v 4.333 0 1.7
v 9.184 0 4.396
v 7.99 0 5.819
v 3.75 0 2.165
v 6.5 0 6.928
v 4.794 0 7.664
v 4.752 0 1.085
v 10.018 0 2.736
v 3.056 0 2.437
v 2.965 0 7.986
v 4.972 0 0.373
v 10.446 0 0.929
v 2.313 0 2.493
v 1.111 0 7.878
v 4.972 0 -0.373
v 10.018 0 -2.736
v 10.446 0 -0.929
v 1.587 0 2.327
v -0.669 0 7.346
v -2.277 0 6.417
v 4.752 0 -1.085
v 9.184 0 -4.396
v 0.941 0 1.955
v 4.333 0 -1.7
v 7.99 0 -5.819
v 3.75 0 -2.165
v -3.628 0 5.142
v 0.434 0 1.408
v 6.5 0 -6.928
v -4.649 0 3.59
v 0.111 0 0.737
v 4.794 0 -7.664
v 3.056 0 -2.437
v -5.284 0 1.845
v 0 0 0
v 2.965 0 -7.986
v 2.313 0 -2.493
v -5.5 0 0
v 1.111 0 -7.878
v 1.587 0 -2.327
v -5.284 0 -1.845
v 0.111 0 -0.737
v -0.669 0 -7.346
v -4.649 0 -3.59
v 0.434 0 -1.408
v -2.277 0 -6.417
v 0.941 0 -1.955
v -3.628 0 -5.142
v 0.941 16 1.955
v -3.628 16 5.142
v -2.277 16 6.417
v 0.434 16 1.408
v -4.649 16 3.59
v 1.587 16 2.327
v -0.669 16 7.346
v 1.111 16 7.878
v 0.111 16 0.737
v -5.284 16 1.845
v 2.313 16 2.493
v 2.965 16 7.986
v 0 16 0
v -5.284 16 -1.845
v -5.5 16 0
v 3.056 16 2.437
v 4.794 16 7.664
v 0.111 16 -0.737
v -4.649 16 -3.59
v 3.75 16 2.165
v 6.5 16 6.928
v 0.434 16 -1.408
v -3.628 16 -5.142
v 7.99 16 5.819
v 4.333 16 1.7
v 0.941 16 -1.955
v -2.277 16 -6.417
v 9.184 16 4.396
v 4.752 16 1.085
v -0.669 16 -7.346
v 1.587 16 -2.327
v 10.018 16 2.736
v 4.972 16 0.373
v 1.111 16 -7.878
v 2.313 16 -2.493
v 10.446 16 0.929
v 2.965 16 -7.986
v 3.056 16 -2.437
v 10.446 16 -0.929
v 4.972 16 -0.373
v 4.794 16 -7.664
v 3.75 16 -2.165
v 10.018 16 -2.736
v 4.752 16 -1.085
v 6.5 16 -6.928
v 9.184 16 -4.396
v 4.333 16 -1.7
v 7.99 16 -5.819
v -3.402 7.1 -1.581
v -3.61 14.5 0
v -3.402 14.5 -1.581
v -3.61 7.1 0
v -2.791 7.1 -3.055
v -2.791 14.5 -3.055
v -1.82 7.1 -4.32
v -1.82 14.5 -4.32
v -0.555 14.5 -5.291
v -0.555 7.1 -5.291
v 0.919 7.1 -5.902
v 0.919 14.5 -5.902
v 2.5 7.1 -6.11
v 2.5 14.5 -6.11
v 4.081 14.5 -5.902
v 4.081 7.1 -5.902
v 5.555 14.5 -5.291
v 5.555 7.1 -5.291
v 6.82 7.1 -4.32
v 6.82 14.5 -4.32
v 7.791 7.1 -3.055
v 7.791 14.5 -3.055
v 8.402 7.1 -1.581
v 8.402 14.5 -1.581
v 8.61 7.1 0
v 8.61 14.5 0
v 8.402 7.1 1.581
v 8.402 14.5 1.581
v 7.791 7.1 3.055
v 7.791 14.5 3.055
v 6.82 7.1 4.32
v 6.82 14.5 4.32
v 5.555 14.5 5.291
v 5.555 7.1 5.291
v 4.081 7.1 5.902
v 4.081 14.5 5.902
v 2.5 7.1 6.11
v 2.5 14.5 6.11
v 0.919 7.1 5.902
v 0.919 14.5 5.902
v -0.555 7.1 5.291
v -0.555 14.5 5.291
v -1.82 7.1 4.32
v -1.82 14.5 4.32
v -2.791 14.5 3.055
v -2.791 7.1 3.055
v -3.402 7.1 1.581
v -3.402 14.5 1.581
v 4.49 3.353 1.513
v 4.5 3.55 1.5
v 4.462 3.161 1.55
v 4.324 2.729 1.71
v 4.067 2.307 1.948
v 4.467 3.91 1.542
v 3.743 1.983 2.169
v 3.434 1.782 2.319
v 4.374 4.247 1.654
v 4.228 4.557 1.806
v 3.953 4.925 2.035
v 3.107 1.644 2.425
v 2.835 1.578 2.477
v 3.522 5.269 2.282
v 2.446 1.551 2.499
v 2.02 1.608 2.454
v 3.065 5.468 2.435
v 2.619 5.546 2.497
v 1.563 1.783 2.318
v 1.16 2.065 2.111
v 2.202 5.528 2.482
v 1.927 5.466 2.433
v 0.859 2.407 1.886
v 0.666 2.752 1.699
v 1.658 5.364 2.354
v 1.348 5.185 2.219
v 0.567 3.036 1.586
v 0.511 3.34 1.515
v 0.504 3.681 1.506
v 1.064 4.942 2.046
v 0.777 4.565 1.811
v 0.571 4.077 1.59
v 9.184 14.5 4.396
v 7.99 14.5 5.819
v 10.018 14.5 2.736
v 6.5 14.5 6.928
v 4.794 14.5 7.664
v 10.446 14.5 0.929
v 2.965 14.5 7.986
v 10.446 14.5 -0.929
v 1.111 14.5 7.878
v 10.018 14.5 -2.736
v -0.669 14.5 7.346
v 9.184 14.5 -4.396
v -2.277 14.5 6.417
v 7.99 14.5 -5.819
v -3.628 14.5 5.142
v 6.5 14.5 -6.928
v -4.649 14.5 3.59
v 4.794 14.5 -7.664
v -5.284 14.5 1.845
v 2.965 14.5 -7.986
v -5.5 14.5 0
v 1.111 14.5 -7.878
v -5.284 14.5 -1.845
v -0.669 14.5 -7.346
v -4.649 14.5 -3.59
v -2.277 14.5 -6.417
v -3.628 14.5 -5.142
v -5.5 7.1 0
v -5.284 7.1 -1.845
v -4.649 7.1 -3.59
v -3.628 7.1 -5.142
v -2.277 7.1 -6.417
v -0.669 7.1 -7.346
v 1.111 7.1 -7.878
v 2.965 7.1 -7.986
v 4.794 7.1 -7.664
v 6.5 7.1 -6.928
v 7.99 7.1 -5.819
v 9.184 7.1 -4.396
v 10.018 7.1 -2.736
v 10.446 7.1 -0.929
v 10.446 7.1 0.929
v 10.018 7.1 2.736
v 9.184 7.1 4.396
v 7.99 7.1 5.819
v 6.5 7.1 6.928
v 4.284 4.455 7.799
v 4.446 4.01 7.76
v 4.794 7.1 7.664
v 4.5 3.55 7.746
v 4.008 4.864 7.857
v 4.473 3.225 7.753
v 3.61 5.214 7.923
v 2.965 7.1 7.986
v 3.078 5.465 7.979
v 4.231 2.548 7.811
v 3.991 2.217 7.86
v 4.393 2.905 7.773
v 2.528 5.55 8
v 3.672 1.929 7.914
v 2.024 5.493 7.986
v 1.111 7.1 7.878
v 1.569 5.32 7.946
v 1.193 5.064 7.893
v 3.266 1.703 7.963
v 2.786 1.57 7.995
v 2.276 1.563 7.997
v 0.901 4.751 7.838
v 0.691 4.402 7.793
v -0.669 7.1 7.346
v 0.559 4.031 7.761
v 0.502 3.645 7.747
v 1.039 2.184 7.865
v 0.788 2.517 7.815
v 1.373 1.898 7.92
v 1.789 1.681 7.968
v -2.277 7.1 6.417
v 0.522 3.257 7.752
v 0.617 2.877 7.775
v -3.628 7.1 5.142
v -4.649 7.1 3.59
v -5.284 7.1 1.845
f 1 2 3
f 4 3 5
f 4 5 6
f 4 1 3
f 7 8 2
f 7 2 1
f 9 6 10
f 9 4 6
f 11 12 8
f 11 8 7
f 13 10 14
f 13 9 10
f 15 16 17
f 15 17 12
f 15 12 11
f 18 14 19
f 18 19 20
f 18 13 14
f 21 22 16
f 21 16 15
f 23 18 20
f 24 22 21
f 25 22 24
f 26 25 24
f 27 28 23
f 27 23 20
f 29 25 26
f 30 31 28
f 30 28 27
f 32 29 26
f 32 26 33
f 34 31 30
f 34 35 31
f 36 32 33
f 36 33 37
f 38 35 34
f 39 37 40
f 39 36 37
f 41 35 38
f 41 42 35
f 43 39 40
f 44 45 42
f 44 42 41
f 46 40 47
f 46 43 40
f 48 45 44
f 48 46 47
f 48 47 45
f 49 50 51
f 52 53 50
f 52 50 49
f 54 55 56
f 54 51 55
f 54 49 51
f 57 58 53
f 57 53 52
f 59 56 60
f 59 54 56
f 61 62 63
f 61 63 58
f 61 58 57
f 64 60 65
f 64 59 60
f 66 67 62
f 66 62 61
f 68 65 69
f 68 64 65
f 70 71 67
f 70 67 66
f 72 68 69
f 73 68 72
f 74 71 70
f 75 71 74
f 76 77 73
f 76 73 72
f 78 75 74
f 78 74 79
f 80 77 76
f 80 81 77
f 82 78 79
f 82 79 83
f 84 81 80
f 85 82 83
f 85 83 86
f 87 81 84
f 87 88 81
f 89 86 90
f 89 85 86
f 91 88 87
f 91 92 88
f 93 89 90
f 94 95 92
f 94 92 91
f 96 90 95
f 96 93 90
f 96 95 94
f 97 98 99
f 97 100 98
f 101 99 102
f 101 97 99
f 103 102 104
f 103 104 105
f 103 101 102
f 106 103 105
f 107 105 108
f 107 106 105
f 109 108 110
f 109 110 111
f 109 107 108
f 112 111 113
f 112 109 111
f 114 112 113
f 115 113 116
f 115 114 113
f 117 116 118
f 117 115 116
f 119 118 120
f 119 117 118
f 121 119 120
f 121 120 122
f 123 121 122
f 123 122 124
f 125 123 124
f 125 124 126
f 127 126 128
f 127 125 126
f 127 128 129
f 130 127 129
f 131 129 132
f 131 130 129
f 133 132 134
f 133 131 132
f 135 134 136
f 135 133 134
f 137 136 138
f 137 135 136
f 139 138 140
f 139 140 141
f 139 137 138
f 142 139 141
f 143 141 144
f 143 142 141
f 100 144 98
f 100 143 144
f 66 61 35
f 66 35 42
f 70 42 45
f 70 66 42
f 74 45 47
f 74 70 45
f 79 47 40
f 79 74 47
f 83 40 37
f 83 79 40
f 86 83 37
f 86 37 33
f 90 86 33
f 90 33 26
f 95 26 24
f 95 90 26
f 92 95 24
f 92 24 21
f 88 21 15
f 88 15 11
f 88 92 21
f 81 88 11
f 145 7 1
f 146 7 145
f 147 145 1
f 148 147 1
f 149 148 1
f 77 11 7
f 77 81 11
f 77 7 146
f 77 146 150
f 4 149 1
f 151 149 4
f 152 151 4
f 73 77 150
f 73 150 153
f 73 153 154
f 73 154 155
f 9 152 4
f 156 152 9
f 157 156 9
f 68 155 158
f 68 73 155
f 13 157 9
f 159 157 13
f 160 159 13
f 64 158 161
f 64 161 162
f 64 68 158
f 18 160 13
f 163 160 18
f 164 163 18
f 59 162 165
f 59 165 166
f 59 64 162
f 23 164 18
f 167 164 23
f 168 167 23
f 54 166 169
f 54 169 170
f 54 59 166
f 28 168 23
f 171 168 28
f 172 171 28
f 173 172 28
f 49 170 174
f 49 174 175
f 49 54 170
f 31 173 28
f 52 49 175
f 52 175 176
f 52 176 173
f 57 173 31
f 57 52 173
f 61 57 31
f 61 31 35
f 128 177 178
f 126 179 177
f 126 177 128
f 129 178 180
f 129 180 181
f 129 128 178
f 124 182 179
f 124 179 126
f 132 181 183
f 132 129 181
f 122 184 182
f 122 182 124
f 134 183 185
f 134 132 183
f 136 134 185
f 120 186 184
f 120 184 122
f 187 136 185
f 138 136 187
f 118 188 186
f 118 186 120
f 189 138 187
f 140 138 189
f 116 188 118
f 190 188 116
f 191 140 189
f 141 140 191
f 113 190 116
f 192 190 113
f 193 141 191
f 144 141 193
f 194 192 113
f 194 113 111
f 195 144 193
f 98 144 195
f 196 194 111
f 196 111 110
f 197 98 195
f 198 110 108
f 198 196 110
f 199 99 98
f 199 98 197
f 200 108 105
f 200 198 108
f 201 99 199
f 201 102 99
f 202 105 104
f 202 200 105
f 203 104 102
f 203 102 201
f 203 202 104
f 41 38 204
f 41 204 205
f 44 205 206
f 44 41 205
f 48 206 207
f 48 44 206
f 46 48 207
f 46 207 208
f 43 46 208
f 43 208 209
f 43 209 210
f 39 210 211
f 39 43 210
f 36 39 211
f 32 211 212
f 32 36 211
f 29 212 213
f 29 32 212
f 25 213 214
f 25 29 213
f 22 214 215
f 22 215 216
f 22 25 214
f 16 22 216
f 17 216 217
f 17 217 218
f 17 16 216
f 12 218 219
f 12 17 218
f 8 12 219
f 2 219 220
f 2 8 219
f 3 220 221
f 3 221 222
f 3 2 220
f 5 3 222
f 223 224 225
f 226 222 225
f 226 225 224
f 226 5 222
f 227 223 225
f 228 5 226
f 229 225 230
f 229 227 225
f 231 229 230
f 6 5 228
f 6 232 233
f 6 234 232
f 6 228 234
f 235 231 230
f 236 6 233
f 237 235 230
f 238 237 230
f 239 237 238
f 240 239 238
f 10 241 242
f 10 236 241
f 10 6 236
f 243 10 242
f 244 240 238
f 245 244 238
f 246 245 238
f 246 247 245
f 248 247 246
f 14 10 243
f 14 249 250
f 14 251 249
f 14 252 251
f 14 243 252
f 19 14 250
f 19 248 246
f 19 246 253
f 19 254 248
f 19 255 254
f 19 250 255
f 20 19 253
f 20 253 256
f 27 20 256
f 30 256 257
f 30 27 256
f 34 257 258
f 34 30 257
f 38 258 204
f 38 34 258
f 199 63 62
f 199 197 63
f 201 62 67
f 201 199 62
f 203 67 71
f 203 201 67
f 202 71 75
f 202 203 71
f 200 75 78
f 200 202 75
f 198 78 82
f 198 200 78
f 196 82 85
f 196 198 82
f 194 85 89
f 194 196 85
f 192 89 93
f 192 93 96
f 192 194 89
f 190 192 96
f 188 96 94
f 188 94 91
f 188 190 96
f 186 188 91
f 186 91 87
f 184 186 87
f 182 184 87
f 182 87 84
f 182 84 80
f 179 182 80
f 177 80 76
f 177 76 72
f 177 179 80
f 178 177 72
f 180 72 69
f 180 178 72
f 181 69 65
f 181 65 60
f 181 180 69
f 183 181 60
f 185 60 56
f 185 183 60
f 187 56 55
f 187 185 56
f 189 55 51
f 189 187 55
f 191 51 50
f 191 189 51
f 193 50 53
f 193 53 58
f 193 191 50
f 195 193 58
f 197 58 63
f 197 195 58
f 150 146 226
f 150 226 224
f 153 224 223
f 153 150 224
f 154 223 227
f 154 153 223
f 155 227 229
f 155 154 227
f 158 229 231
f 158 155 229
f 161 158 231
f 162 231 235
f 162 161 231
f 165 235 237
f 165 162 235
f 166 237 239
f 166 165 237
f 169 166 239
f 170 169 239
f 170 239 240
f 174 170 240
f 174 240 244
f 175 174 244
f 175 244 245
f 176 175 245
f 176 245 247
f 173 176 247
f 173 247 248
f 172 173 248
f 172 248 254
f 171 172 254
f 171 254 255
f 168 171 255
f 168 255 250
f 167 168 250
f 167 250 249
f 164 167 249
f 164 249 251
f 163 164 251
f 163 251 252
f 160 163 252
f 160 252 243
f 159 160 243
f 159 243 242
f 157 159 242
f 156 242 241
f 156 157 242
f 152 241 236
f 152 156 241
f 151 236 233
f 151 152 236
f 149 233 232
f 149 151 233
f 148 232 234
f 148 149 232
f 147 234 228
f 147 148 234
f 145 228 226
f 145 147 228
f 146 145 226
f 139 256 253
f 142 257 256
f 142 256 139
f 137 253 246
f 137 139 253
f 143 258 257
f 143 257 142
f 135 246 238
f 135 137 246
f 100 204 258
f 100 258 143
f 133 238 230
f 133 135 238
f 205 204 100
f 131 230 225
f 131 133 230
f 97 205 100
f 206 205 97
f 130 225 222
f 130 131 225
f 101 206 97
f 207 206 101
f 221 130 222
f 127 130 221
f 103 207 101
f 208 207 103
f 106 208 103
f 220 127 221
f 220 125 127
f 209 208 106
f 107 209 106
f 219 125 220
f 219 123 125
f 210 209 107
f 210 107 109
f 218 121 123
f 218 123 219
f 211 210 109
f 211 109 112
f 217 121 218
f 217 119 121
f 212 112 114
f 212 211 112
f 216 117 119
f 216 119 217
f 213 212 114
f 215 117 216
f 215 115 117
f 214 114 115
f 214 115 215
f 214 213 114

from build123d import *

# Parameters (mm, degrees)
SKETCH2_R          = 2
CUT_EXTRUDE1_DEPTH = 10


with BuildPart() as part:
    # Sketch1 → Revolve1 (revolve)
    with BuildSketch(Plane.XY):
        Polygon((0, 0), (0, 16), (-5.5, 16), (-5.5, 14.5), (-3.61, 14.5), (-3.61, 7.1), (-5.5, 7.1), (-5.5, 0), align=None)
    revolve(axis=Axis((2.5, 19.494779208, 0), (0, -1, 0)))

    # Sketch2 → Cut-Extrude1 (cut)
    with BuildSketch(Plane.XY):
        with Locations((2.5, 3.55)):
            Circle(SKETCH2_R)
    extrude(amount=CUT_EXTRUDE1_DEPTH, mode=Mode.SUBTRACT)


solid = part.part
